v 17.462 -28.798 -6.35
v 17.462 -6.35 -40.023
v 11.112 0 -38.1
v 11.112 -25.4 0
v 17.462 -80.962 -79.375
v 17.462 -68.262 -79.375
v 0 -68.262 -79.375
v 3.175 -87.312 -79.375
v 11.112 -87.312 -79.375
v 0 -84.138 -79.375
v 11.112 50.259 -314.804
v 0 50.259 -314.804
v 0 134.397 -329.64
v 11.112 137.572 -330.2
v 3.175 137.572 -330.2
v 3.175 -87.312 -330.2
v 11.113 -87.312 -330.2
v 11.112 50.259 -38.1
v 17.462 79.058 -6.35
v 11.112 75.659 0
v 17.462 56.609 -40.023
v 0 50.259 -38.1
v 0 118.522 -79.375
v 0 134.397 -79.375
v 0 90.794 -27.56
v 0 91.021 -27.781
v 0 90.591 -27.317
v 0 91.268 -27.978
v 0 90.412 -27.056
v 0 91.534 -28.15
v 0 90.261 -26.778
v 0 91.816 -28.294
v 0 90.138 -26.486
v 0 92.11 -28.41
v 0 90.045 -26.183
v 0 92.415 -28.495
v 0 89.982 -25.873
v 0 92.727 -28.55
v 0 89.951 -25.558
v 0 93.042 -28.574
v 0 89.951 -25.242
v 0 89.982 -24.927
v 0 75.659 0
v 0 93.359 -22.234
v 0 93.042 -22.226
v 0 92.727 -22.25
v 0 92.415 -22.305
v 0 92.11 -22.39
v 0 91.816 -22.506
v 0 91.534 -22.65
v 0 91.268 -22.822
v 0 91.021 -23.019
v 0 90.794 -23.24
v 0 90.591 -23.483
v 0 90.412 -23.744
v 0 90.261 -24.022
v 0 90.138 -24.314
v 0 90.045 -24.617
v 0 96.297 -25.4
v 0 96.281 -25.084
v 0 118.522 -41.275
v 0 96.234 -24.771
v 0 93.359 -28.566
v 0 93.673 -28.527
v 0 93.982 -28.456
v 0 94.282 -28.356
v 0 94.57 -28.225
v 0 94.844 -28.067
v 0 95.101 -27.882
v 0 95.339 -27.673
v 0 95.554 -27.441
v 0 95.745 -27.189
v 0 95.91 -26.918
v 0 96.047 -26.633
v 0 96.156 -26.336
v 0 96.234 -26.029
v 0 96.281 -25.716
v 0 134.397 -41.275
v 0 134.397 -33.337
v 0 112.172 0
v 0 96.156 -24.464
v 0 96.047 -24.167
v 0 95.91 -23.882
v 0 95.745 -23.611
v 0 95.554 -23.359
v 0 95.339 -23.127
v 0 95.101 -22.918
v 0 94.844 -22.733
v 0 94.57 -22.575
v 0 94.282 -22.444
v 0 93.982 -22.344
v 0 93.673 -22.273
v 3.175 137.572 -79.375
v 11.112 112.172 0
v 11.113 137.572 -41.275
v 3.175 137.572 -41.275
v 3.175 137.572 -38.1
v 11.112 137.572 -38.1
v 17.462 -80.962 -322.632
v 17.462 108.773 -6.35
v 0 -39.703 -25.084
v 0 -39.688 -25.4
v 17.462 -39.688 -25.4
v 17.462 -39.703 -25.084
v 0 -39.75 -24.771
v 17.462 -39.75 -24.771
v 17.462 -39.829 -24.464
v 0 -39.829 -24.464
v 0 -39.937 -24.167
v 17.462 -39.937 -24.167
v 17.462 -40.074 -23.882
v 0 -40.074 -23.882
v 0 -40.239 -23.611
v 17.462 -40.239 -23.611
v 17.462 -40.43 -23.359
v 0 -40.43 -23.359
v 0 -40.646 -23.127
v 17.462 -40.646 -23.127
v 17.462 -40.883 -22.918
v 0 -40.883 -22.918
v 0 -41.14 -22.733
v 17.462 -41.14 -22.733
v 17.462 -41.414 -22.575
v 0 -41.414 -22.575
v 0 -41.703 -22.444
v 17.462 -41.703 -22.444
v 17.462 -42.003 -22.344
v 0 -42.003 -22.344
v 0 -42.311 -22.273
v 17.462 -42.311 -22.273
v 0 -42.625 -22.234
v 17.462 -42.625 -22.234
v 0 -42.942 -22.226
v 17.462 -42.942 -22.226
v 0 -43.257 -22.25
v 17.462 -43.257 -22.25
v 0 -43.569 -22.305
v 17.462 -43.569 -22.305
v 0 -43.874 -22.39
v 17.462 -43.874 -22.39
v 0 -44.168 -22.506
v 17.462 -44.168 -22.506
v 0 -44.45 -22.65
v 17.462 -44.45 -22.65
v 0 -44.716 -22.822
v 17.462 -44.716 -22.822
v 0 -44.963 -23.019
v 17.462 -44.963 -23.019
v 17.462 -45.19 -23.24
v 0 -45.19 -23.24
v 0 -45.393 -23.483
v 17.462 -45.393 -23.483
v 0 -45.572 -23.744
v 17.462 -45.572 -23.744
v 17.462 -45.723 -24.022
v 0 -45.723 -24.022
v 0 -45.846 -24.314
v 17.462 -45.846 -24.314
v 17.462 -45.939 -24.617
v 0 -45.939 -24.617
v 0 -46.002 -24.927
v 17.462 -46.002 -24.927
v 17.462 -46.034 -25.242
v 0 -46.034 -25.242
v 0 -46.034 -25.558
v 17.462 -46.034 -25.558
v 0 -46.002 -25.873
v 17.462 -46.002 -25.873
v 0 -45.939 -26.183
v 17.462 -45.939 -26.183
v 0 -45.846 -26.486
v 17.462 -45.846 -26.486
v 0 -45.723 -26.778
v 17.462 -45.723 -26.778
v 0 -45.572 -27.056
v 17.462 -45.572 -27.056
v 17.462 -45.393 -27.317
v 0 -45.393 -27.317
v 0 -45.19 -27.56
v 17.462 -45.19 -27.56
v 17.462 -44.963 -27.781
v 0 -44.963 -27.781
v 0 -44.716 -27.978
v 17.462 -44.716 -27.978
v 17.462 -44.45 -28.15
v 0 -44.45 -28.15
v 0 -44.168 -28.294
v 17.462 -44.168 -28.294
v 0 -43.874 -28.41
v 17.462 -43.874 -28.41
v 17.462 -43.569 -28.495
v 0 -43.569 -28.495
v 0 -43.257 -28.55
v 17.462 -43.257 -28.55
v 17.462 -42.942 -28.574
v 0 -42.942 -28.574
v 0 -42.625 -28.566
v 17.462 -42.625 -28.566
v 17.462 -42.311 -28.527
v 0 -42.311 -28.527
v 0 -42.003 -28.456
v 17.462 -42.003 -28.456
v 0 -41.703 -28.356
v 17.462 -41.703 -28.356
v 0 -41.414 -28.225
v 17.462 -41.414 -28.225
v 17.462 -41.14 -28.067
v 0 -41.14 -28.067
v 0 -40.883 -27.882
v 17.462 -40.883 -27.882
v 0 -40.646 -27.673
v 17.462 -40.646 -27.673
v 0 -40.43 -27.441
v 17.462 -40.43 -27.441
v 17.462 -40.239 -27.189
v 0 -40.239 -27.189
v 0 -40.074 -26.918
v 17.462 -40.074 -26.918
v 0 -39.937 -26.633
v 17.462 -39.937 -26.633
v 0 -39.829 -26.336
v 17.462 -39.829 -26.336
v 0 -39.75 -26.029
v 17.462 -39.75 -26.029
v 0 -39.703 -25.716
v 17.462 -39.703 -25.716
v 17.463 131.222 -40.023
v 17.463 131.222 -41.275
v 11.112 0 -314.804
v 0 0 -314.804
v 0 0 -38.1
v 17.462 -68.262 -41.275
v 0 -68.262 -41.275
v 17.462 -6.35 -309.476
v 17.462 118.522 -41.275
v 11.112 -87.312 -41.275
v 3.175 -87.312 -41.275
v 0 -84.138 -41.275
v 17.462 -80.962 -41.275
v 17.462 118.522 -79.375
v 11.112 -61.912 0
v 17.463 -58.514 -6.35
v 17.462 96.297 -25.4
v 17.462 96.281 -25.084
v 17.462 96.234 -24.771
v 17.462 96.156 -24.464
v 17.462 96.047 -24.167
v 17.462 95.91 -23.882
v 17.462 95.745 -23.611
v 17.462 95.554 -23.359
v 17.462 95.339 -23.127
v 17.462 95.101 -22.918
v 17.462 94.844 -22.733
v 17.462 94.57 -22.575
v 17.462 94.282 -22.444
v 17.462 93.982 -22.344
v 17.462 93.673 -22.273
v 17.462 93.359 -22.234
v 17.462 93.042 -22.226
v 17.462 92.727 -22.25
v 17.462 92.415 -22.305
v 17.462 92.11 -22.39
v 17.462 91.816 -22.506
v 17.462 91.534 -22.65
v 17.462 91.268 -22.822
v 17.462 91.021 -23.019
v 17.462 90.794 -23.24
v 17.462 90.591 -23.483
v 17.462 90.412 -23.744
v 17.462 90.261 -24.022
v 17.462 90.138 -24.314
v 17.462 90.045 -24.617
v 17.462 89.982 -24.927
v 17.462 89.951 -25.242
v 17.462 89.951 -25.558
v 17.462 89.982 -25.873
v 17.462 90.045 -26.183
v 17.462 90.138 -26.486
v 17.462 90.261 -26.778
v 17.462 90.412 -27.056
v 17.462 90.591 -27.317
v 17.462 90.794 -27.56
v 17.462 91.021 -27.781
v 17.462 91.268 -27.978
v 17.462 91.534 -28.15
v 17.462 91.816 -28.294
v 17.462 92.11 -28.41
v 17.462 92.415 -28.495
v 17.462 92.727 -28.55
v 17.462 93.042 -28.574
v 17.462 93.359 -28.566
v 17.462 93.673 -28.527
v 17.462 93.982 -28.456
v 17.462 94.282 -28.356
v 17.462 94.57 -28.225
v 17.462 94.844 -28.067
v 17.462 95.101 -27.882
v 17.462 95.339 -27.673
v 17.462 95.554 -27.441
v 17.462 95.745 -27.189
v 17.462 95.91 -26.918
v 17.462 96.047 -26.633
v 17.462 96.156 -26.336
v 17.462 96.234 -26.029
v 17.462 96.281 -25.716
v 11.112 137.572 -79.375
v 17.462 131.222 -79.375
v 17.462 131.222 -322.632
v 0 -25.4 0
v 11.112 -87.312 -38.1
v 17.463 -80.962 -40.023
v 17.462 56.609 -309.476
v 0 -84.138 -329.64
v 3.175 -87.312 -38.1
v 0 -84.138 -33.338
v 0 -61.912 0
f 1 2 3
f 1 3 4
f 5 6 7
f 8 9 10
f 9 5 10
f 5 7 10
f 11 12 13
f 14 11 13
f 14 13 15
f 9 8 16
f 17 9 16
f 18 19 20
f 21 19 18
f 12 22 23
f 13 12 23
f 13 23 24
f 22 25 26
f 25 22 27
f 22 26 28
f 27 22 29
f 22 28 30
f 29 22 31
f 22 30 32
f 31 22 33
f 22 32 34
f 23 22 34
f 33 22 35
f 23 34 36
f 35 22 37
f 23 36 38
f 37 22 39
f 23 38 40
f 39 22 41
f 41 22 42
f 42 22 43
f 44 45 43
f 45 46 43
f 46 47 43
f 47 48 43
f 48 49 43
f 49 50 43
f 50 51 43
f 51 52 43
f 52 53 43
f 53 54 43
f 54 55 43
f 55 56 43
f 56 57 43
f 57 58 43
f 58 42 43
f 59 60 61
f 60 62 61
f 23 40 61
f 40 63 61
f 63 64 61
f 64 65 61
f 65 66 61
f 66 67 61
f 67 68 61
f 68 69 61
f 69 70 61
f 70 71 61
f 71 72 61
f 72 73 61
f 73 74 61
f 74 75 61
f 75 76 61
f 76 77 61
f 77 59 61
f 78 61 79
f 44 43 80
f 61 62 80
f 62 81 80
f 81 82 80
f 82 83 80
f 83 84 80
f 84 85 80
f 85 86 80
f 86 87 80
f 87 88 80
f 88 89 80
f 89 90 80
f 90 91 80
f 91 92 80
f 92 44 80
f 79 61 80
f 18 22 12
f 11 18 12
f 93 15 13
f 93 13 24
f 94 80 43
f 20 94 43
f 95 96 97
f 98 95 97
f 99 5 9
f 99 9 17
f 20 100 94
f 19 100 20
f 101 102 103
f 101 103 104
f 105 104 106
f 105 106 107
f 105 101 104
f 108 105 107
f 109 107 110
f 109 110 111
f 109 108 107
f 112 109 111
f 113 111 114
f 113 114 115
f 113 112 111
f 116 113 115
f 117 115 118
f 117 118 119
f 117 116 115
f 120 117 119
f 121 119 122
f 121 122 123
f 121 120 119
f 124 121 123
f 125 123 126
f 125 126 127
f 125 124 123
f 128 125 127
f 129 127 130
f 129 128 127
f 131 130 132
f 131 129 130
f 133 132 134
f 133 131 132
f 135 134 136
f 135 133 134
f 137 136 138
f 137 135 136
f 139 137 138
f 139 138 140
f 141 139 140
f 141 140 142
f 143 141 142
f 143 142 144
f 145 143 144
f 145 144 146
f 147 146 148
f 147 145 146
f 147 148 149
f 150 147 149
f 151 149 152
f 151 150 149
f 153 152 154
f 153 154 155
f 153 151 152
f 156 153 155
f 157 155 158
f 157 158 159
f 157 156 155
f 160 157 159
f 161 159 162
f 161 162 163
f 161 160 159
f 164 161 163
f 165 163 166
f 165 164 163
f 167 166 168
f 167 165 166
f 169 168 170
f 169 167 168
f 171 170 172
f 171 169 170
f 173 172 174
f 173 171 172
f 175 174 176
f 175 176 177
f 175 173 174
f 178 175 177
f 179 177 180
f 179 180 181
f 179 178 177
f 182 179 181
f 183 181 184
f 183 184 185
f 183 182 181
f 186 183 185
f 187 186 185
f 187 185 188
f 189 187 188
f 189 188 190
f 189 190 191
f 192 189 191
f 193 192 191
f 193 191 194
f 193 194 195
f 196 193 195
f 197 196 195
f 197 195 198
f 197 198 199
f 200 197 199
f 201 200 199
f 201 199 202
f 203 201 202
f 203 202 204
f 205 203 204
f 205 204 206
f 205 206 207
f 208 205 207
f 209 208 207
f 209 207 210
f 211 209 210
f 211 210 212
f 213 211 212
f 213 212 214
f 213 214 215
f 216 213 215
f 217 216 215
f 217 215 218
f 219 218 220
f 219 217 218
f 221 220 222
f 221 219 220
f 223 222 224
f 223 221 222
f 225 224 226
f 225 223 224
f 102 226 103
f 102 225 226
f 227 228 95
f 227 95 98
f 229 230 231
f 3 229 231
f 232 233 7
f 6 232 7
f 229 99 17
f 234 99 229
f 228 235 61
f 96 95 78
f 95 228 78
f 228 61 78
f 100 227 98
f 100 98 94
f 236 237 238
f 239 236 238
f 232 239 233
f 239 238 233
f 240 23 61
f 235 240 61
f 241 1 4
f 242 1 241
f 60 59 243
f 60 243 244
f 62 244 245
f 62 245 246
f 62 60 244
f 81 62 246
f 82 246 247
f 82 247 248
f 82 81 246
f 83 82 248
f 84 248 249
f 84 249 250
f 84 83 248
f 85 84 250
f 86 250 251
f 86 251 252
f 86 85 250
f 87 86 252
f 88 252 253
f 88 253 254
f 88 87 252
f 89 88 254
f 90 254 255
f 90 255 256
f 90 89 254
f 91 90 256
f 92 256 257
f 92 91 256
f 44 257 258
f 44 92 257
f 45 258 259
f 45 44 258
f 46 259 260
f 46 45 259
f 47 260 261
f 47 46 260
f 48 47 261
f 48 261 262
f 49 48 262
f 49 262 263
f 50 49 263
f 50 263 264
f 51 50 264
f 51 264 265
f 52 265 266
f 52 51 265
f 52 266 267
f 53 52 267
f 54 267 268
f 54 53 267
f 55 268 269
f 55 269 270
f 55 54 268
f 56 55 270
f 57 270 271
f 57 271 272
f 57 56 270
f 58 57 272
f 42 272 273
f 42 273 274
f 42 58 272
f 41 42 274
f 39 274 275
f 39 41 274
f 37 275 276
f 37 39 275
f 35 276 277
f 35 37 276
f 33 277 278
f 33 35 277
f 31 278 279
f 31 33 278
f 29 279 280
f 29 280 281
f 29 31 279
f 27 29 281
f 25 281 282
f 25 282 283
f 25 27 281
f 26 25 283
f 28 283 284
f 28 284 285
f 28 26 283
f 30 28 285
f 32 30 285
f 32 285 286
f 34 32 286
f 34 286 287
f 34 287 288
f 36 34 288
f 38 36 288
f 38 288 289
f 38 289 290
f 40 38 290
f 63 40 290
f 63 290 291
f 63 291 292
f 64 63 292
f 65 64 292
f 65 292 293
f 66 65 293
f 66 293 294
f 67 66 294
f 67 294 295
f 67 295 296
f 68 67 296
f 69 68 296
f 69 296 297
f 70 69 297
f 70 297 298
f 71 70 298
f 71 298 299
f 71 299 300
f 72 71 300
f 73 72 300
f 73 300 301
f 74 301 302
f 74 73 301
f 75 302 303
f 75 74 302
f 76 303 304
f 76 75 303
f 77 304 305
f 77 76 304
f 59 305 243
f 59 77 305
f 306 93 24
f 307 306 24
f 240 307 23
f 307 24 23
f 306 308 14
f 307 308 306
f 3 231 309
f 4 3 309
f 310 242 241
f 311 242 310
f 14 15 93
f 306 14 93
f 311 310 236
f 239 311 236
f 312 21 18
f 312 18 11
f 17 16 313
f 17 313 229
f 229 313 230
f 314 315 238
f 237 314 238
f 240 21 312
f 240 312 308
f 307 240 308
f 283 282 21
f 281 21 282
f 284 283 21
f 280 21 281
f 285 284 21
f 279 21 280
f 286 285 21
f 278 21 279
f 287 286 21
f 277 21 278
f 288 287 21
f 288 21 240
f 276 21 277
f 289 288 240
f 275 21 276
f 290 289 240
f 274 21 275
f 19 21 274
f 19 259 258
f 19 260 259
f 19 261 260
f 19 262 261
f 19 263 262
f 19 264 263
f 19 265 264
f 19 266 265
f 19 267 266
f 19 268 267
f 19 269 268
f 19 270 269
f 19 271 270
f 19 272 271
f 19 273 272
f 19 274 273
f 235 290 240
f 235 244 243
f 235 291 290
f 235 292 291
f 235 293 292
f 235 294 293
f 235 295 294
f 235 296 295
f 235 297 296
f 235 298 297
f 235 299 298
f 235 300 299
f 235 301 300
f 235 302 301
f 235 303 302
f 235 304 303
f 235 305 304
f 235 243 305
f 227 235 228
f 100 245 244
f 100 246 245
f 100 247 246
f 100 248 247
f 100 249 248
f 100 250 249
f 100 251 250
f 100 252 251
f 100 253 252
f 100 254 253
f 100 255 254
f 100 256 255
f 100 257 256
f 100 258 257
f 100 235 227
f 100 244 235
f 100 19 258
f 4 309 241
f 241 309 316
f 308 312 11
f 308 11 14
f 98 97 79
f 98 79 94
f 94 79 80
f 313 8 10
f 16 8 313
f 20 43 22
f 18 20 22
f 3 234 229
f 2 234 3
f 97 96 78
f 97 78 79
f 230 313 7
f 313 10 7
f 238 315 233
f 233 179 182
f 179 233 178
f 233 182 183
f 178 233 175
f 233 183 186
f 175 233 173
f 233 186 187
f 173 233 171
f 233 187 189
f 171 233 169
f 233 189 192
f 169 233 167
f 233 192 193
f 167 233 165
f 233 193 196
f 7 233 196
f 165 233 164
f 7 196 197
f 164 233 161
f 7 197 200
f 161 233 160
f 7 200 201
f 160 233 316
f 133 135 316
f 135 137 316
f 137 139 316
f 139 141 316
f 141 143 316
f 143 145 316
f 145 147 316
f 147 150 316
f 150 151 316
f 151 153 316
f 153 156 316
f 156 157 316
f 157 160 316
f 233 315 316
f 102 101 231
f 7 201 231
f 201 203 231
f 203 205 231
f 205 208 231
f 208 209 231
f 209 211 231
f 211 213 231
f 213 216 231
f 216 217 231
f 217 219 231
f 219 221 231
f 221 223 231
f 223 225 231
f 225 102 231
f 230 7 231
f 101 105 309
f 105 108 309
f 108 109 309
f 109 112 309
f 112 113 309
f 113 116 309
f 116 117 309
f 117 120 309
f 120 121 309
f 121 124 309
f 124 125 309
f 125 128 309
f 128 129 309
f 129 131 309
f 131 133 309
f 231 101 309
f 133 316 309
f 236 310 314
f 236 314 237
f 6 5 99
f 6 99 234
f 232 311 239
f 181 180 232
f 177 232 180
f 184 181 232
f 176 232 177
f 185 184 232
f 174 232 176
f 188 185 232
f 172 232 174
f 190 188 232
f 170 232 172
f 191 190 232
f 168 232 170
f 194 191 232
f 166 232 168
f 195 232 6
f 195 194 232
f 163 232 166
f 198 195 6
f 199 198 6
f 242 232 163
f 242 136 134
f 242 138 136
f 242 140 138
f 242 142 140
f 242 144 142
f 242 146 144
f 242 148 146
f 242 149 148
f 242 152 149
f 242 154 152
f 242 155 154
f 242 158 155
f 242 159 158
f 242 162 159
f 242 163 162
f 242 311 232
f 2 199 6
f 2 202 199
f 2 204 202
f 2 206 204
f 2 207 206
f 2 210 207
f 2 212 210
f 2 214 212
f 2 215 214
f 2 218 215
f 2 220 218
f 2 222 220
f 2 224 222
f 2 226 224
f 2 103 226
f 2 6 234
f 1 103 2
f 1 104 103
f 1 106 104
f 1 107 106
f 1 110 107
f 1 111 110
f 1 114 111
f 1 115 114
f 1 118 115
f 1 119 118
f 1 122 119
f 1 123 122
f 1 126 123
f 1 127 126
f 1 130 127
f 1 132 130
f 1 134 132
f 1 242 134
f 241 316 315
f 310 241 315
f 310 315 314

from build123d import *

# Parameters (mm, degrees)
F0_R      = 3.175
F1_DEPTH  = 17.4625
F2_SIZE   = 6.35
F2_2_SIZE = 6.35
F3_SIZE   = 3.175
F3_2_SIZE = 3.175


# Not quite as in the source:
# - a feature names something its author has since deleted; it is built from what else it names


with BuildPart() as f1:
    # F0 (on Right) → F1 (new body)
    with BuildSketch(Plane.YZ):
        Polygon((0, -314.8044504969), (0, -38.1), (-25.4, 0), (-61.9125, 0), (-87.3125, -38.1), (-87.3125, -41.275), (-68.2625, -41.275), (-68.2625, -79.375), (-87.3125, -79.375), (-87.3125, -330.2), align=None)
        with Locations((-42.8625, -25.4)):
            Circle(F0_R, mode=Mode.SUBTRACT)
    extrude(amount=F1_DEPTH)

    # F2
    f2_edges = [f1.edges().sort_by_distance(p)[0] for p in [
        (17.4625, -74.6125, -19.05),
        (17.4625, -43.65625, 0),
        (17.4625, -12.7, -19.05),
        (17.4625, 0, -176.452225),
        (17.4625, -87.3125, -39.6875),
        (17.4625, -43.65625, -322.502225),
        (17.4625, -87.3125, -204.7875),
    ]]
    chamfer(f2_edges, length=F2_SIZE)

    # F3#2
    f3_2_edges = [f1.edges().sort_by_distance(p)[0] for p in [
        (0, -87.3125, -39.6875),
        (0, -87.3125, -204.7875),
    ]]
    chamfer(f3_2_edges, length=F3_2_SIZE)


with BuildPart() as f1b:
    # F0 (on Right) → F1, piece 2 (new body)
    with BuildSketch(Plane.YZ):
        Polygon((137.5715984106, -38.1), (112.1715984106, 0), (75.6590984106, 0), (50.2590984106, -38.1), (50.2590984106, -314.8044504969), (137.5715984106, -330.2), (137.5715984106, -79.375), (118.5215984106, -79.375), (118.5215984106, -41.275), (137.5715984106, -41.275), align=None)
        with Locations((93.1215984106, -25.4)):
            Circle(F0_R, mode=Mode.SUBTRACT)
    extrude(amount=F1_DEPTH)

    # F2#2
    f2_2_edges = [f1b.edges().sort_by_distance(p)[0] for p in [
        (17.4625, 93.915348, -322.502225),
        (17.4625, 50.259098, -176.452225),
        (17.4625, 124.871598, -19.05),
        (17.4625, 93.915348, 0),
        (17.4625, 62.959098, -19.05),
        (17.4625, 137.571598, -204.7875),
        (17.4625, 137.571598, -39.6875),
    ]]
    chamfer(f2_2_edges, length=F2_2_SIZE)

    # F3
    f3_edges = [f1b.edges().sort_by_distance(p)[0] for p in [
        (0, 137.571598, -204.7875),
        (0, 137.571598, -39.6875),
    ]]
    chamfer(f3_edges, length=F3_SIZE)


solid = Compound([f1.part, f1b.part])
